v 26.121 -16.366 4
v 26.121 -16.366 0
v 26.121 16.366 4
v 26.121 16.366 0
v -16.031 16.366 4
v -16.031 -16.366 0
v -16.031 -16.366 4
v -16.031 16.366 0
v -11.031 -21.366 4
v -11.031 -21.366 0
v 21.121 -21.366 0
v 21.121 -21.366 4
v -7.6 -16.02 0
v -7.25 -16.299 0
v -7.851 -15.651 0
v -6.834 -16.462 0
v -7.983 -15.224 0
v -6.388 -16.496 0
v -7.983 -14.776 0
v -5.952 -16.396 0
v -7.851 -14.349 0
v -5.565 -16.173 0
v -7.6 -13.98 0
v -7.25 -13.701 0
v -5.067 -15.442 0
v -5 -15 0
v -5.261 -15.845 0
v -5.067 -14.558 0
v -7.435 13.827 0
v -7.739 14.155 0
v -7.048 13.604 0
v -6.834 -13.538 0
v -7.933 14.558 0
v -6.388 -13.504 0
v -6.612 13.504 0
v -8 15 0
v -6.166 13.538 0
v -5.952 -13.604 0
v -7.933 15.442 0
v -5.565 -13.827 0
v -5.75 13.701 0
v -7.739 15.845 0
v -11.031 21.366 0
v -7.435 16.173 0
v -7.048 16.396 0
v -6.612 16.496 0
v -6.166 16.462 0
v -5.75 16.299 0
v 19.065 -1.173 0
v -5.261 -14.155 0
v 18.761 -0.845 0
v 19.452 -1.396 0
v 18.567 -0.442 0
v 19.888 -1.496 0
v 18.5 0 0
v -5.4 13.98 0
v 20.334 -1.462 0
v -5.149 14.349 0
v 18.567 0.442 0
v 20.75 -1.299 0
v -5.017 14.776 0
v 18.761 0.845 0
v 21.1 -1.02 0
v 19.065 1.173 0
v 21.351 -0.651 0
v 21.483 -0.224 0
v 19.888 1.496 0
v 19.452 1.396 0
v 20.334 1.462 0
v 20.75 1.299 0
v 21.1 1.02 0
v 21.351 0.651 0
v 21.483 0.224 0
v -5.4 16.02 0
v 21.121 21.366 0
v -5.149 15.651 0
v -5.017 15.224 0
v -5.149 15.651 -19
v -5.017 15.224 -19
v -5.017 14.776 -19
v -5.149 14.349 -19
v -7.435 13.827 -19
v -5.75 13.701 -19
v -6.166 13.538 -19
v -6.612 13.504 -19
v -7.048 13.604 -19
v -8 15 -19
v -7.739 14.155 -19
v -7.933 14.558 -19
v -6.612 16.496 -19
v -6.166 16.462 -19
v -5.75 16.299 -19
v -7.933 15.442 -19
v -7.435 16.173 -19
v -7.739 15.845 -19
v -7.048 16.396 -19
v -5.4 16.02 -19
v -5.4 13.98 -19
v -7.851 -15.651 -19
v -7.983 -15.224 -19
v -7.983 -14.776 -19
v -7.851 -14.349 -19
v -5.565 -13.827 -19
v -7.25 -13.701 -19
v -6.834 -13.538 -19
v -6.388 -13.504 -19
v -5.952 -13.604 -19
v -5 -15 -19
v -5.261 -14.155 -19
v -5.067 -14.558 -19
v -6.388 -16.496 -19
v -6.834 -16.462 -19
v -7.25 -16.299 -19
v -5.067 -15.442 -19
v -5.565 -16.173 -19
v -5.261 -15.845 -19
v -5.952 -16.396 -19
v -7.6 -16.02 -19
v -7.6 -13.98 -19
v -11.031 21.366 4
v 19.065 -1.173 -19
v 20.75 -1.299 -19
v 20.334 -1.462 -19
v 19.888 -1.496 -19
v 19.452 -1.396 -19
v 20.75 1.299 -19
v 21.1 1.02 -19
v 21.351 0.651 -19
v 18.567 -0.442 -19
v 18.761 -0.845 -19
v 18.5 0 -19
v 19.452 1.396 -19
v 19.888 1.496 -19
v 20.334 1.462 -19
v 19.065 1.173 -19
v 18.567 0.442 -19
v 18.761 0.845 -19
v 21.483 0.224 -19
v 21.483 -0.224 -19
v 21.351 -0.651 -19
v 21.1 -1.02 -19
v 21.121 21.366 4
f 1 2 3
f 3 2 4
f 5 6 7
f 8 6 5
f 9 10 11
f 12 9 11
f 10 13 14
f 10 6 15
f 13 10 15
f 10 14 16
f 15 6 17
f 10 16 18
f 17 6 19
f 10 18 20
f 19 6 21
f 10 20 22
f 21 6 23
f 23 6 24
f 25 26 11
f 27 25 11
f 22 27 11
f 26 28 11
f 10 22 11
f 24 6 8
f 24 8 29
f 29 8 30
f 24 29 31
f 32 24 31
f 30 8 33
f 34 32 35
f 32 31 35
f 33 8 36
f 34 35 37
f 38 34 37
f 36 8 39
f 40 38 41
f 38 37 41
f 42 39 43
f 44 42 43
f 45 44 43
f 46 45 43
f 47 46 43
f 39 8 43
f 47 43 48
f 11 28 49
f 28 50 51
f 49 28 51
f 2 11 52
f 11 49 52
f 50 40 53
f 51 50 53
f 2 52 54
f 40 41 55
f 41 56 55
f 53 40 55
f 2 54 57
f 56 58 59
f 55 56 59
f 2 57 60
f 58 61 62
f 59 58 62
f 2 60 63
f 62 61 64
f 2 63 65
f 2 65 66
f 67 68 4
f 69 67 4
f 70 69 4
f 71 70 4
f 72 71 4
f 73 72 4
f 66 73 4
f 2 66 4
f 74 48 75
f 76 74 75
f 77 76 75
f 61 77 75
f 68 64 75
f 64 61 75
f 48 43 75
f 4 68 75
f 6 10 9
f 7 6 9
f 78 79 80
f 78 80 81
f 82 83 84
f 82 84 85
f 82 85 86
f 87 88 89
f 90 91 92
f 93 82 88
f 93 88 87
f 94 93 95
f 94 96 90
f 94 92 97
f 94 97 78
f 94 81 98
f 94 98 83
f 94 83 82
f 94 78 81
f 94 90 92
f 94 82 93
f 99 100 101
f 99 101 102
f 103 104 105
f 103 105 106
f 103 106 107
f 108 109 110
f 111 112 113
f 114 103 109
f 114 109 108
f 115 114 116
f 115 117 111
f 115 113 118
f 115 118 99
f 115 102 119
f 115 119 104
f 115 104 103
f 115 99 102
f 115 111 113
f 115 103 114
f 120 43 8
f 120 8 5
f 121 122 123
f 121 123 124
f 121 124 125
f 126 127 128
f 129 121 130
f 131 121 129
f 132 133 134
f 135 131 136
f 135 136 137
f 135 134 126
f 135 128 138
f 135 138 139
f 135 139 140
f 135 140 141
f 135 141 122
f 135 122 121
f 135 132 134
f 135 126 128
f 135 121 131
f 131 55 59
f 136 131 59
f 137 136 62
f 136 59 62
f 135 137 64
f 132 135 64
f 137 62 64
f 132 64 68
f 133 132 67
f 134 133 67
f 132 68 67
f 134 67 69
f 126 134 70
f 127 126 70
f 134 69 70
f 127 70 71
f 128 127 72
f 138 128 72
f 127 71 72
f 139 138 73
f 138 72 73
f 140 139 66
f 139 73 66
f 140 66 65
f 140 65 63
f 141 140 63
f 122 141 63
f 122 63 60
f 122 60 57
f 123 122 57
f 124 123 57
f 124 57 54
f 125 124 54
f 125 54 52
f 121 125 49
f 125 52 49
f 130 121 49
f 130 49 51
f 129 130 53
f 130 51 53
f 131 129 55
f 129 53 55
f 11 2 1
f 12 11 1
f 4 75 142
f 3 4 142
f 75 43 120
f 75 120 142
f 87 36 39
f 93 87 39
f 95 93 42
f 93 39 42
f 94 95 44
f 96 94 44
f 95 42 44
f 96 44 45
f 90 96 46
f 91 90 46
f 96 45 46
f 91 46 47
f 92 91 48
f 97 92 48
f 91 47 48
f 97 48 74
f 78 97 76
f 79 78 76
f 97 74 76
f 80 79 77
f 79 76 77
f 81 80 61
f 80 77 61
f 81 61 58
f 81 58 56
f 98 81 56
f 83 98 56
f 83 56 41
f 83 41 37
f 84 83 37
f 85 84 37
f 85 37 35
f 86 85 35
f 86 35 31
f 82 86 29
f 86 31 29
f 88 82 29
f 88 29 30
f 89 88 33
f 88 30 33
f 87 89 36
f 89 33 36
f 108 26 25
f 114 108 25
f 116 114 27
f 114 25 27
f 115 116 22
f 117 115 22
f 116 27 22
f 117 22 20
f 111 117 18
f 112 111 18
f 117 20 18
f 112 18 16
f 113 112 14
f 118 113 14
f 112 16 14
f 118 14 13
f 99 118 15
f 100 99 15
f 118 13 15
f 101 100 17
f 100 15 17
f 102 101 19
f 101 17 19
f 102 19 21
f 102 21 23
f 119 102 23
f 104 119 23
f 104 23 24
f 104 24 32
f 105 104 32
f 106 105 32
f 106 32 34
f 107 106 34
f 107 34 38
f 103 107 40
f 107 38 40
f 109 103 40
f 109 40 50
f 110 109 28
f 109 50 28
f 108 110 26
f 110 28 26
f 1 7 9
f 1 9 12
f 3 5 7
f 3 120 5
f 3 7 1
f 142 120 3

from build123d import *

# Parameters (mm, degrees)
ESQUISSE1_W        = 42.15149663
ESQUISSE1_H        = 42.731591692
BOSS_EXTRU_1_DEPTH = 4
CHANFREIN1_SIZE    = 5
ESQUISSE3_R        = 1.5
BOSS_EXTRU_3_DEPTH = 19


with BuildPart() as part:
    # Esquisse1 → Boss.-Extru.1 (new body)
    with BuildSketch(Plane.XY):
        with Locations((5.045077825, 0)):
            Rectangle(ESQUISSE1_W, ESQUISSE1_H)
    extrude(amount=BOSS_EXTRU_1_DEPTH)

    # Chanfrein1
    chanfrein1_edges = [part.edges().sort_by_distance(p)[0] for p in [
        (-16.03067049, -21.365795846, 2),
        (-16.03067049, 21.365795846, 2),
        (26.12082614, 21.365795846, 2),
        (26.12082614, -21.365795846, 2),
    ]]
    chamfer(chanfrein1_edges, length=CHANFREIN1_SIZE)

    # Esquisse3 → Boss.-Extru.3 (add)
    with BuildSketch(Plane(origin=(0, 0, 0), x_dir=(-1, 0, 0), z_dir=(0, 0, -1))):
        with Locations((-20, 0)):
            Circle(ESQUISSE3_R)
        with Locations((6.5, 15)):
            Circle(ESQUISSE3_R)
        with Locations(Location((6.5, -15, 0), (0, 0, 180))):
            Circle(ESQUISSE3_R)
    extrude(amount=BOSS_EXTRU_3_DEPTH)


solid = part.part
